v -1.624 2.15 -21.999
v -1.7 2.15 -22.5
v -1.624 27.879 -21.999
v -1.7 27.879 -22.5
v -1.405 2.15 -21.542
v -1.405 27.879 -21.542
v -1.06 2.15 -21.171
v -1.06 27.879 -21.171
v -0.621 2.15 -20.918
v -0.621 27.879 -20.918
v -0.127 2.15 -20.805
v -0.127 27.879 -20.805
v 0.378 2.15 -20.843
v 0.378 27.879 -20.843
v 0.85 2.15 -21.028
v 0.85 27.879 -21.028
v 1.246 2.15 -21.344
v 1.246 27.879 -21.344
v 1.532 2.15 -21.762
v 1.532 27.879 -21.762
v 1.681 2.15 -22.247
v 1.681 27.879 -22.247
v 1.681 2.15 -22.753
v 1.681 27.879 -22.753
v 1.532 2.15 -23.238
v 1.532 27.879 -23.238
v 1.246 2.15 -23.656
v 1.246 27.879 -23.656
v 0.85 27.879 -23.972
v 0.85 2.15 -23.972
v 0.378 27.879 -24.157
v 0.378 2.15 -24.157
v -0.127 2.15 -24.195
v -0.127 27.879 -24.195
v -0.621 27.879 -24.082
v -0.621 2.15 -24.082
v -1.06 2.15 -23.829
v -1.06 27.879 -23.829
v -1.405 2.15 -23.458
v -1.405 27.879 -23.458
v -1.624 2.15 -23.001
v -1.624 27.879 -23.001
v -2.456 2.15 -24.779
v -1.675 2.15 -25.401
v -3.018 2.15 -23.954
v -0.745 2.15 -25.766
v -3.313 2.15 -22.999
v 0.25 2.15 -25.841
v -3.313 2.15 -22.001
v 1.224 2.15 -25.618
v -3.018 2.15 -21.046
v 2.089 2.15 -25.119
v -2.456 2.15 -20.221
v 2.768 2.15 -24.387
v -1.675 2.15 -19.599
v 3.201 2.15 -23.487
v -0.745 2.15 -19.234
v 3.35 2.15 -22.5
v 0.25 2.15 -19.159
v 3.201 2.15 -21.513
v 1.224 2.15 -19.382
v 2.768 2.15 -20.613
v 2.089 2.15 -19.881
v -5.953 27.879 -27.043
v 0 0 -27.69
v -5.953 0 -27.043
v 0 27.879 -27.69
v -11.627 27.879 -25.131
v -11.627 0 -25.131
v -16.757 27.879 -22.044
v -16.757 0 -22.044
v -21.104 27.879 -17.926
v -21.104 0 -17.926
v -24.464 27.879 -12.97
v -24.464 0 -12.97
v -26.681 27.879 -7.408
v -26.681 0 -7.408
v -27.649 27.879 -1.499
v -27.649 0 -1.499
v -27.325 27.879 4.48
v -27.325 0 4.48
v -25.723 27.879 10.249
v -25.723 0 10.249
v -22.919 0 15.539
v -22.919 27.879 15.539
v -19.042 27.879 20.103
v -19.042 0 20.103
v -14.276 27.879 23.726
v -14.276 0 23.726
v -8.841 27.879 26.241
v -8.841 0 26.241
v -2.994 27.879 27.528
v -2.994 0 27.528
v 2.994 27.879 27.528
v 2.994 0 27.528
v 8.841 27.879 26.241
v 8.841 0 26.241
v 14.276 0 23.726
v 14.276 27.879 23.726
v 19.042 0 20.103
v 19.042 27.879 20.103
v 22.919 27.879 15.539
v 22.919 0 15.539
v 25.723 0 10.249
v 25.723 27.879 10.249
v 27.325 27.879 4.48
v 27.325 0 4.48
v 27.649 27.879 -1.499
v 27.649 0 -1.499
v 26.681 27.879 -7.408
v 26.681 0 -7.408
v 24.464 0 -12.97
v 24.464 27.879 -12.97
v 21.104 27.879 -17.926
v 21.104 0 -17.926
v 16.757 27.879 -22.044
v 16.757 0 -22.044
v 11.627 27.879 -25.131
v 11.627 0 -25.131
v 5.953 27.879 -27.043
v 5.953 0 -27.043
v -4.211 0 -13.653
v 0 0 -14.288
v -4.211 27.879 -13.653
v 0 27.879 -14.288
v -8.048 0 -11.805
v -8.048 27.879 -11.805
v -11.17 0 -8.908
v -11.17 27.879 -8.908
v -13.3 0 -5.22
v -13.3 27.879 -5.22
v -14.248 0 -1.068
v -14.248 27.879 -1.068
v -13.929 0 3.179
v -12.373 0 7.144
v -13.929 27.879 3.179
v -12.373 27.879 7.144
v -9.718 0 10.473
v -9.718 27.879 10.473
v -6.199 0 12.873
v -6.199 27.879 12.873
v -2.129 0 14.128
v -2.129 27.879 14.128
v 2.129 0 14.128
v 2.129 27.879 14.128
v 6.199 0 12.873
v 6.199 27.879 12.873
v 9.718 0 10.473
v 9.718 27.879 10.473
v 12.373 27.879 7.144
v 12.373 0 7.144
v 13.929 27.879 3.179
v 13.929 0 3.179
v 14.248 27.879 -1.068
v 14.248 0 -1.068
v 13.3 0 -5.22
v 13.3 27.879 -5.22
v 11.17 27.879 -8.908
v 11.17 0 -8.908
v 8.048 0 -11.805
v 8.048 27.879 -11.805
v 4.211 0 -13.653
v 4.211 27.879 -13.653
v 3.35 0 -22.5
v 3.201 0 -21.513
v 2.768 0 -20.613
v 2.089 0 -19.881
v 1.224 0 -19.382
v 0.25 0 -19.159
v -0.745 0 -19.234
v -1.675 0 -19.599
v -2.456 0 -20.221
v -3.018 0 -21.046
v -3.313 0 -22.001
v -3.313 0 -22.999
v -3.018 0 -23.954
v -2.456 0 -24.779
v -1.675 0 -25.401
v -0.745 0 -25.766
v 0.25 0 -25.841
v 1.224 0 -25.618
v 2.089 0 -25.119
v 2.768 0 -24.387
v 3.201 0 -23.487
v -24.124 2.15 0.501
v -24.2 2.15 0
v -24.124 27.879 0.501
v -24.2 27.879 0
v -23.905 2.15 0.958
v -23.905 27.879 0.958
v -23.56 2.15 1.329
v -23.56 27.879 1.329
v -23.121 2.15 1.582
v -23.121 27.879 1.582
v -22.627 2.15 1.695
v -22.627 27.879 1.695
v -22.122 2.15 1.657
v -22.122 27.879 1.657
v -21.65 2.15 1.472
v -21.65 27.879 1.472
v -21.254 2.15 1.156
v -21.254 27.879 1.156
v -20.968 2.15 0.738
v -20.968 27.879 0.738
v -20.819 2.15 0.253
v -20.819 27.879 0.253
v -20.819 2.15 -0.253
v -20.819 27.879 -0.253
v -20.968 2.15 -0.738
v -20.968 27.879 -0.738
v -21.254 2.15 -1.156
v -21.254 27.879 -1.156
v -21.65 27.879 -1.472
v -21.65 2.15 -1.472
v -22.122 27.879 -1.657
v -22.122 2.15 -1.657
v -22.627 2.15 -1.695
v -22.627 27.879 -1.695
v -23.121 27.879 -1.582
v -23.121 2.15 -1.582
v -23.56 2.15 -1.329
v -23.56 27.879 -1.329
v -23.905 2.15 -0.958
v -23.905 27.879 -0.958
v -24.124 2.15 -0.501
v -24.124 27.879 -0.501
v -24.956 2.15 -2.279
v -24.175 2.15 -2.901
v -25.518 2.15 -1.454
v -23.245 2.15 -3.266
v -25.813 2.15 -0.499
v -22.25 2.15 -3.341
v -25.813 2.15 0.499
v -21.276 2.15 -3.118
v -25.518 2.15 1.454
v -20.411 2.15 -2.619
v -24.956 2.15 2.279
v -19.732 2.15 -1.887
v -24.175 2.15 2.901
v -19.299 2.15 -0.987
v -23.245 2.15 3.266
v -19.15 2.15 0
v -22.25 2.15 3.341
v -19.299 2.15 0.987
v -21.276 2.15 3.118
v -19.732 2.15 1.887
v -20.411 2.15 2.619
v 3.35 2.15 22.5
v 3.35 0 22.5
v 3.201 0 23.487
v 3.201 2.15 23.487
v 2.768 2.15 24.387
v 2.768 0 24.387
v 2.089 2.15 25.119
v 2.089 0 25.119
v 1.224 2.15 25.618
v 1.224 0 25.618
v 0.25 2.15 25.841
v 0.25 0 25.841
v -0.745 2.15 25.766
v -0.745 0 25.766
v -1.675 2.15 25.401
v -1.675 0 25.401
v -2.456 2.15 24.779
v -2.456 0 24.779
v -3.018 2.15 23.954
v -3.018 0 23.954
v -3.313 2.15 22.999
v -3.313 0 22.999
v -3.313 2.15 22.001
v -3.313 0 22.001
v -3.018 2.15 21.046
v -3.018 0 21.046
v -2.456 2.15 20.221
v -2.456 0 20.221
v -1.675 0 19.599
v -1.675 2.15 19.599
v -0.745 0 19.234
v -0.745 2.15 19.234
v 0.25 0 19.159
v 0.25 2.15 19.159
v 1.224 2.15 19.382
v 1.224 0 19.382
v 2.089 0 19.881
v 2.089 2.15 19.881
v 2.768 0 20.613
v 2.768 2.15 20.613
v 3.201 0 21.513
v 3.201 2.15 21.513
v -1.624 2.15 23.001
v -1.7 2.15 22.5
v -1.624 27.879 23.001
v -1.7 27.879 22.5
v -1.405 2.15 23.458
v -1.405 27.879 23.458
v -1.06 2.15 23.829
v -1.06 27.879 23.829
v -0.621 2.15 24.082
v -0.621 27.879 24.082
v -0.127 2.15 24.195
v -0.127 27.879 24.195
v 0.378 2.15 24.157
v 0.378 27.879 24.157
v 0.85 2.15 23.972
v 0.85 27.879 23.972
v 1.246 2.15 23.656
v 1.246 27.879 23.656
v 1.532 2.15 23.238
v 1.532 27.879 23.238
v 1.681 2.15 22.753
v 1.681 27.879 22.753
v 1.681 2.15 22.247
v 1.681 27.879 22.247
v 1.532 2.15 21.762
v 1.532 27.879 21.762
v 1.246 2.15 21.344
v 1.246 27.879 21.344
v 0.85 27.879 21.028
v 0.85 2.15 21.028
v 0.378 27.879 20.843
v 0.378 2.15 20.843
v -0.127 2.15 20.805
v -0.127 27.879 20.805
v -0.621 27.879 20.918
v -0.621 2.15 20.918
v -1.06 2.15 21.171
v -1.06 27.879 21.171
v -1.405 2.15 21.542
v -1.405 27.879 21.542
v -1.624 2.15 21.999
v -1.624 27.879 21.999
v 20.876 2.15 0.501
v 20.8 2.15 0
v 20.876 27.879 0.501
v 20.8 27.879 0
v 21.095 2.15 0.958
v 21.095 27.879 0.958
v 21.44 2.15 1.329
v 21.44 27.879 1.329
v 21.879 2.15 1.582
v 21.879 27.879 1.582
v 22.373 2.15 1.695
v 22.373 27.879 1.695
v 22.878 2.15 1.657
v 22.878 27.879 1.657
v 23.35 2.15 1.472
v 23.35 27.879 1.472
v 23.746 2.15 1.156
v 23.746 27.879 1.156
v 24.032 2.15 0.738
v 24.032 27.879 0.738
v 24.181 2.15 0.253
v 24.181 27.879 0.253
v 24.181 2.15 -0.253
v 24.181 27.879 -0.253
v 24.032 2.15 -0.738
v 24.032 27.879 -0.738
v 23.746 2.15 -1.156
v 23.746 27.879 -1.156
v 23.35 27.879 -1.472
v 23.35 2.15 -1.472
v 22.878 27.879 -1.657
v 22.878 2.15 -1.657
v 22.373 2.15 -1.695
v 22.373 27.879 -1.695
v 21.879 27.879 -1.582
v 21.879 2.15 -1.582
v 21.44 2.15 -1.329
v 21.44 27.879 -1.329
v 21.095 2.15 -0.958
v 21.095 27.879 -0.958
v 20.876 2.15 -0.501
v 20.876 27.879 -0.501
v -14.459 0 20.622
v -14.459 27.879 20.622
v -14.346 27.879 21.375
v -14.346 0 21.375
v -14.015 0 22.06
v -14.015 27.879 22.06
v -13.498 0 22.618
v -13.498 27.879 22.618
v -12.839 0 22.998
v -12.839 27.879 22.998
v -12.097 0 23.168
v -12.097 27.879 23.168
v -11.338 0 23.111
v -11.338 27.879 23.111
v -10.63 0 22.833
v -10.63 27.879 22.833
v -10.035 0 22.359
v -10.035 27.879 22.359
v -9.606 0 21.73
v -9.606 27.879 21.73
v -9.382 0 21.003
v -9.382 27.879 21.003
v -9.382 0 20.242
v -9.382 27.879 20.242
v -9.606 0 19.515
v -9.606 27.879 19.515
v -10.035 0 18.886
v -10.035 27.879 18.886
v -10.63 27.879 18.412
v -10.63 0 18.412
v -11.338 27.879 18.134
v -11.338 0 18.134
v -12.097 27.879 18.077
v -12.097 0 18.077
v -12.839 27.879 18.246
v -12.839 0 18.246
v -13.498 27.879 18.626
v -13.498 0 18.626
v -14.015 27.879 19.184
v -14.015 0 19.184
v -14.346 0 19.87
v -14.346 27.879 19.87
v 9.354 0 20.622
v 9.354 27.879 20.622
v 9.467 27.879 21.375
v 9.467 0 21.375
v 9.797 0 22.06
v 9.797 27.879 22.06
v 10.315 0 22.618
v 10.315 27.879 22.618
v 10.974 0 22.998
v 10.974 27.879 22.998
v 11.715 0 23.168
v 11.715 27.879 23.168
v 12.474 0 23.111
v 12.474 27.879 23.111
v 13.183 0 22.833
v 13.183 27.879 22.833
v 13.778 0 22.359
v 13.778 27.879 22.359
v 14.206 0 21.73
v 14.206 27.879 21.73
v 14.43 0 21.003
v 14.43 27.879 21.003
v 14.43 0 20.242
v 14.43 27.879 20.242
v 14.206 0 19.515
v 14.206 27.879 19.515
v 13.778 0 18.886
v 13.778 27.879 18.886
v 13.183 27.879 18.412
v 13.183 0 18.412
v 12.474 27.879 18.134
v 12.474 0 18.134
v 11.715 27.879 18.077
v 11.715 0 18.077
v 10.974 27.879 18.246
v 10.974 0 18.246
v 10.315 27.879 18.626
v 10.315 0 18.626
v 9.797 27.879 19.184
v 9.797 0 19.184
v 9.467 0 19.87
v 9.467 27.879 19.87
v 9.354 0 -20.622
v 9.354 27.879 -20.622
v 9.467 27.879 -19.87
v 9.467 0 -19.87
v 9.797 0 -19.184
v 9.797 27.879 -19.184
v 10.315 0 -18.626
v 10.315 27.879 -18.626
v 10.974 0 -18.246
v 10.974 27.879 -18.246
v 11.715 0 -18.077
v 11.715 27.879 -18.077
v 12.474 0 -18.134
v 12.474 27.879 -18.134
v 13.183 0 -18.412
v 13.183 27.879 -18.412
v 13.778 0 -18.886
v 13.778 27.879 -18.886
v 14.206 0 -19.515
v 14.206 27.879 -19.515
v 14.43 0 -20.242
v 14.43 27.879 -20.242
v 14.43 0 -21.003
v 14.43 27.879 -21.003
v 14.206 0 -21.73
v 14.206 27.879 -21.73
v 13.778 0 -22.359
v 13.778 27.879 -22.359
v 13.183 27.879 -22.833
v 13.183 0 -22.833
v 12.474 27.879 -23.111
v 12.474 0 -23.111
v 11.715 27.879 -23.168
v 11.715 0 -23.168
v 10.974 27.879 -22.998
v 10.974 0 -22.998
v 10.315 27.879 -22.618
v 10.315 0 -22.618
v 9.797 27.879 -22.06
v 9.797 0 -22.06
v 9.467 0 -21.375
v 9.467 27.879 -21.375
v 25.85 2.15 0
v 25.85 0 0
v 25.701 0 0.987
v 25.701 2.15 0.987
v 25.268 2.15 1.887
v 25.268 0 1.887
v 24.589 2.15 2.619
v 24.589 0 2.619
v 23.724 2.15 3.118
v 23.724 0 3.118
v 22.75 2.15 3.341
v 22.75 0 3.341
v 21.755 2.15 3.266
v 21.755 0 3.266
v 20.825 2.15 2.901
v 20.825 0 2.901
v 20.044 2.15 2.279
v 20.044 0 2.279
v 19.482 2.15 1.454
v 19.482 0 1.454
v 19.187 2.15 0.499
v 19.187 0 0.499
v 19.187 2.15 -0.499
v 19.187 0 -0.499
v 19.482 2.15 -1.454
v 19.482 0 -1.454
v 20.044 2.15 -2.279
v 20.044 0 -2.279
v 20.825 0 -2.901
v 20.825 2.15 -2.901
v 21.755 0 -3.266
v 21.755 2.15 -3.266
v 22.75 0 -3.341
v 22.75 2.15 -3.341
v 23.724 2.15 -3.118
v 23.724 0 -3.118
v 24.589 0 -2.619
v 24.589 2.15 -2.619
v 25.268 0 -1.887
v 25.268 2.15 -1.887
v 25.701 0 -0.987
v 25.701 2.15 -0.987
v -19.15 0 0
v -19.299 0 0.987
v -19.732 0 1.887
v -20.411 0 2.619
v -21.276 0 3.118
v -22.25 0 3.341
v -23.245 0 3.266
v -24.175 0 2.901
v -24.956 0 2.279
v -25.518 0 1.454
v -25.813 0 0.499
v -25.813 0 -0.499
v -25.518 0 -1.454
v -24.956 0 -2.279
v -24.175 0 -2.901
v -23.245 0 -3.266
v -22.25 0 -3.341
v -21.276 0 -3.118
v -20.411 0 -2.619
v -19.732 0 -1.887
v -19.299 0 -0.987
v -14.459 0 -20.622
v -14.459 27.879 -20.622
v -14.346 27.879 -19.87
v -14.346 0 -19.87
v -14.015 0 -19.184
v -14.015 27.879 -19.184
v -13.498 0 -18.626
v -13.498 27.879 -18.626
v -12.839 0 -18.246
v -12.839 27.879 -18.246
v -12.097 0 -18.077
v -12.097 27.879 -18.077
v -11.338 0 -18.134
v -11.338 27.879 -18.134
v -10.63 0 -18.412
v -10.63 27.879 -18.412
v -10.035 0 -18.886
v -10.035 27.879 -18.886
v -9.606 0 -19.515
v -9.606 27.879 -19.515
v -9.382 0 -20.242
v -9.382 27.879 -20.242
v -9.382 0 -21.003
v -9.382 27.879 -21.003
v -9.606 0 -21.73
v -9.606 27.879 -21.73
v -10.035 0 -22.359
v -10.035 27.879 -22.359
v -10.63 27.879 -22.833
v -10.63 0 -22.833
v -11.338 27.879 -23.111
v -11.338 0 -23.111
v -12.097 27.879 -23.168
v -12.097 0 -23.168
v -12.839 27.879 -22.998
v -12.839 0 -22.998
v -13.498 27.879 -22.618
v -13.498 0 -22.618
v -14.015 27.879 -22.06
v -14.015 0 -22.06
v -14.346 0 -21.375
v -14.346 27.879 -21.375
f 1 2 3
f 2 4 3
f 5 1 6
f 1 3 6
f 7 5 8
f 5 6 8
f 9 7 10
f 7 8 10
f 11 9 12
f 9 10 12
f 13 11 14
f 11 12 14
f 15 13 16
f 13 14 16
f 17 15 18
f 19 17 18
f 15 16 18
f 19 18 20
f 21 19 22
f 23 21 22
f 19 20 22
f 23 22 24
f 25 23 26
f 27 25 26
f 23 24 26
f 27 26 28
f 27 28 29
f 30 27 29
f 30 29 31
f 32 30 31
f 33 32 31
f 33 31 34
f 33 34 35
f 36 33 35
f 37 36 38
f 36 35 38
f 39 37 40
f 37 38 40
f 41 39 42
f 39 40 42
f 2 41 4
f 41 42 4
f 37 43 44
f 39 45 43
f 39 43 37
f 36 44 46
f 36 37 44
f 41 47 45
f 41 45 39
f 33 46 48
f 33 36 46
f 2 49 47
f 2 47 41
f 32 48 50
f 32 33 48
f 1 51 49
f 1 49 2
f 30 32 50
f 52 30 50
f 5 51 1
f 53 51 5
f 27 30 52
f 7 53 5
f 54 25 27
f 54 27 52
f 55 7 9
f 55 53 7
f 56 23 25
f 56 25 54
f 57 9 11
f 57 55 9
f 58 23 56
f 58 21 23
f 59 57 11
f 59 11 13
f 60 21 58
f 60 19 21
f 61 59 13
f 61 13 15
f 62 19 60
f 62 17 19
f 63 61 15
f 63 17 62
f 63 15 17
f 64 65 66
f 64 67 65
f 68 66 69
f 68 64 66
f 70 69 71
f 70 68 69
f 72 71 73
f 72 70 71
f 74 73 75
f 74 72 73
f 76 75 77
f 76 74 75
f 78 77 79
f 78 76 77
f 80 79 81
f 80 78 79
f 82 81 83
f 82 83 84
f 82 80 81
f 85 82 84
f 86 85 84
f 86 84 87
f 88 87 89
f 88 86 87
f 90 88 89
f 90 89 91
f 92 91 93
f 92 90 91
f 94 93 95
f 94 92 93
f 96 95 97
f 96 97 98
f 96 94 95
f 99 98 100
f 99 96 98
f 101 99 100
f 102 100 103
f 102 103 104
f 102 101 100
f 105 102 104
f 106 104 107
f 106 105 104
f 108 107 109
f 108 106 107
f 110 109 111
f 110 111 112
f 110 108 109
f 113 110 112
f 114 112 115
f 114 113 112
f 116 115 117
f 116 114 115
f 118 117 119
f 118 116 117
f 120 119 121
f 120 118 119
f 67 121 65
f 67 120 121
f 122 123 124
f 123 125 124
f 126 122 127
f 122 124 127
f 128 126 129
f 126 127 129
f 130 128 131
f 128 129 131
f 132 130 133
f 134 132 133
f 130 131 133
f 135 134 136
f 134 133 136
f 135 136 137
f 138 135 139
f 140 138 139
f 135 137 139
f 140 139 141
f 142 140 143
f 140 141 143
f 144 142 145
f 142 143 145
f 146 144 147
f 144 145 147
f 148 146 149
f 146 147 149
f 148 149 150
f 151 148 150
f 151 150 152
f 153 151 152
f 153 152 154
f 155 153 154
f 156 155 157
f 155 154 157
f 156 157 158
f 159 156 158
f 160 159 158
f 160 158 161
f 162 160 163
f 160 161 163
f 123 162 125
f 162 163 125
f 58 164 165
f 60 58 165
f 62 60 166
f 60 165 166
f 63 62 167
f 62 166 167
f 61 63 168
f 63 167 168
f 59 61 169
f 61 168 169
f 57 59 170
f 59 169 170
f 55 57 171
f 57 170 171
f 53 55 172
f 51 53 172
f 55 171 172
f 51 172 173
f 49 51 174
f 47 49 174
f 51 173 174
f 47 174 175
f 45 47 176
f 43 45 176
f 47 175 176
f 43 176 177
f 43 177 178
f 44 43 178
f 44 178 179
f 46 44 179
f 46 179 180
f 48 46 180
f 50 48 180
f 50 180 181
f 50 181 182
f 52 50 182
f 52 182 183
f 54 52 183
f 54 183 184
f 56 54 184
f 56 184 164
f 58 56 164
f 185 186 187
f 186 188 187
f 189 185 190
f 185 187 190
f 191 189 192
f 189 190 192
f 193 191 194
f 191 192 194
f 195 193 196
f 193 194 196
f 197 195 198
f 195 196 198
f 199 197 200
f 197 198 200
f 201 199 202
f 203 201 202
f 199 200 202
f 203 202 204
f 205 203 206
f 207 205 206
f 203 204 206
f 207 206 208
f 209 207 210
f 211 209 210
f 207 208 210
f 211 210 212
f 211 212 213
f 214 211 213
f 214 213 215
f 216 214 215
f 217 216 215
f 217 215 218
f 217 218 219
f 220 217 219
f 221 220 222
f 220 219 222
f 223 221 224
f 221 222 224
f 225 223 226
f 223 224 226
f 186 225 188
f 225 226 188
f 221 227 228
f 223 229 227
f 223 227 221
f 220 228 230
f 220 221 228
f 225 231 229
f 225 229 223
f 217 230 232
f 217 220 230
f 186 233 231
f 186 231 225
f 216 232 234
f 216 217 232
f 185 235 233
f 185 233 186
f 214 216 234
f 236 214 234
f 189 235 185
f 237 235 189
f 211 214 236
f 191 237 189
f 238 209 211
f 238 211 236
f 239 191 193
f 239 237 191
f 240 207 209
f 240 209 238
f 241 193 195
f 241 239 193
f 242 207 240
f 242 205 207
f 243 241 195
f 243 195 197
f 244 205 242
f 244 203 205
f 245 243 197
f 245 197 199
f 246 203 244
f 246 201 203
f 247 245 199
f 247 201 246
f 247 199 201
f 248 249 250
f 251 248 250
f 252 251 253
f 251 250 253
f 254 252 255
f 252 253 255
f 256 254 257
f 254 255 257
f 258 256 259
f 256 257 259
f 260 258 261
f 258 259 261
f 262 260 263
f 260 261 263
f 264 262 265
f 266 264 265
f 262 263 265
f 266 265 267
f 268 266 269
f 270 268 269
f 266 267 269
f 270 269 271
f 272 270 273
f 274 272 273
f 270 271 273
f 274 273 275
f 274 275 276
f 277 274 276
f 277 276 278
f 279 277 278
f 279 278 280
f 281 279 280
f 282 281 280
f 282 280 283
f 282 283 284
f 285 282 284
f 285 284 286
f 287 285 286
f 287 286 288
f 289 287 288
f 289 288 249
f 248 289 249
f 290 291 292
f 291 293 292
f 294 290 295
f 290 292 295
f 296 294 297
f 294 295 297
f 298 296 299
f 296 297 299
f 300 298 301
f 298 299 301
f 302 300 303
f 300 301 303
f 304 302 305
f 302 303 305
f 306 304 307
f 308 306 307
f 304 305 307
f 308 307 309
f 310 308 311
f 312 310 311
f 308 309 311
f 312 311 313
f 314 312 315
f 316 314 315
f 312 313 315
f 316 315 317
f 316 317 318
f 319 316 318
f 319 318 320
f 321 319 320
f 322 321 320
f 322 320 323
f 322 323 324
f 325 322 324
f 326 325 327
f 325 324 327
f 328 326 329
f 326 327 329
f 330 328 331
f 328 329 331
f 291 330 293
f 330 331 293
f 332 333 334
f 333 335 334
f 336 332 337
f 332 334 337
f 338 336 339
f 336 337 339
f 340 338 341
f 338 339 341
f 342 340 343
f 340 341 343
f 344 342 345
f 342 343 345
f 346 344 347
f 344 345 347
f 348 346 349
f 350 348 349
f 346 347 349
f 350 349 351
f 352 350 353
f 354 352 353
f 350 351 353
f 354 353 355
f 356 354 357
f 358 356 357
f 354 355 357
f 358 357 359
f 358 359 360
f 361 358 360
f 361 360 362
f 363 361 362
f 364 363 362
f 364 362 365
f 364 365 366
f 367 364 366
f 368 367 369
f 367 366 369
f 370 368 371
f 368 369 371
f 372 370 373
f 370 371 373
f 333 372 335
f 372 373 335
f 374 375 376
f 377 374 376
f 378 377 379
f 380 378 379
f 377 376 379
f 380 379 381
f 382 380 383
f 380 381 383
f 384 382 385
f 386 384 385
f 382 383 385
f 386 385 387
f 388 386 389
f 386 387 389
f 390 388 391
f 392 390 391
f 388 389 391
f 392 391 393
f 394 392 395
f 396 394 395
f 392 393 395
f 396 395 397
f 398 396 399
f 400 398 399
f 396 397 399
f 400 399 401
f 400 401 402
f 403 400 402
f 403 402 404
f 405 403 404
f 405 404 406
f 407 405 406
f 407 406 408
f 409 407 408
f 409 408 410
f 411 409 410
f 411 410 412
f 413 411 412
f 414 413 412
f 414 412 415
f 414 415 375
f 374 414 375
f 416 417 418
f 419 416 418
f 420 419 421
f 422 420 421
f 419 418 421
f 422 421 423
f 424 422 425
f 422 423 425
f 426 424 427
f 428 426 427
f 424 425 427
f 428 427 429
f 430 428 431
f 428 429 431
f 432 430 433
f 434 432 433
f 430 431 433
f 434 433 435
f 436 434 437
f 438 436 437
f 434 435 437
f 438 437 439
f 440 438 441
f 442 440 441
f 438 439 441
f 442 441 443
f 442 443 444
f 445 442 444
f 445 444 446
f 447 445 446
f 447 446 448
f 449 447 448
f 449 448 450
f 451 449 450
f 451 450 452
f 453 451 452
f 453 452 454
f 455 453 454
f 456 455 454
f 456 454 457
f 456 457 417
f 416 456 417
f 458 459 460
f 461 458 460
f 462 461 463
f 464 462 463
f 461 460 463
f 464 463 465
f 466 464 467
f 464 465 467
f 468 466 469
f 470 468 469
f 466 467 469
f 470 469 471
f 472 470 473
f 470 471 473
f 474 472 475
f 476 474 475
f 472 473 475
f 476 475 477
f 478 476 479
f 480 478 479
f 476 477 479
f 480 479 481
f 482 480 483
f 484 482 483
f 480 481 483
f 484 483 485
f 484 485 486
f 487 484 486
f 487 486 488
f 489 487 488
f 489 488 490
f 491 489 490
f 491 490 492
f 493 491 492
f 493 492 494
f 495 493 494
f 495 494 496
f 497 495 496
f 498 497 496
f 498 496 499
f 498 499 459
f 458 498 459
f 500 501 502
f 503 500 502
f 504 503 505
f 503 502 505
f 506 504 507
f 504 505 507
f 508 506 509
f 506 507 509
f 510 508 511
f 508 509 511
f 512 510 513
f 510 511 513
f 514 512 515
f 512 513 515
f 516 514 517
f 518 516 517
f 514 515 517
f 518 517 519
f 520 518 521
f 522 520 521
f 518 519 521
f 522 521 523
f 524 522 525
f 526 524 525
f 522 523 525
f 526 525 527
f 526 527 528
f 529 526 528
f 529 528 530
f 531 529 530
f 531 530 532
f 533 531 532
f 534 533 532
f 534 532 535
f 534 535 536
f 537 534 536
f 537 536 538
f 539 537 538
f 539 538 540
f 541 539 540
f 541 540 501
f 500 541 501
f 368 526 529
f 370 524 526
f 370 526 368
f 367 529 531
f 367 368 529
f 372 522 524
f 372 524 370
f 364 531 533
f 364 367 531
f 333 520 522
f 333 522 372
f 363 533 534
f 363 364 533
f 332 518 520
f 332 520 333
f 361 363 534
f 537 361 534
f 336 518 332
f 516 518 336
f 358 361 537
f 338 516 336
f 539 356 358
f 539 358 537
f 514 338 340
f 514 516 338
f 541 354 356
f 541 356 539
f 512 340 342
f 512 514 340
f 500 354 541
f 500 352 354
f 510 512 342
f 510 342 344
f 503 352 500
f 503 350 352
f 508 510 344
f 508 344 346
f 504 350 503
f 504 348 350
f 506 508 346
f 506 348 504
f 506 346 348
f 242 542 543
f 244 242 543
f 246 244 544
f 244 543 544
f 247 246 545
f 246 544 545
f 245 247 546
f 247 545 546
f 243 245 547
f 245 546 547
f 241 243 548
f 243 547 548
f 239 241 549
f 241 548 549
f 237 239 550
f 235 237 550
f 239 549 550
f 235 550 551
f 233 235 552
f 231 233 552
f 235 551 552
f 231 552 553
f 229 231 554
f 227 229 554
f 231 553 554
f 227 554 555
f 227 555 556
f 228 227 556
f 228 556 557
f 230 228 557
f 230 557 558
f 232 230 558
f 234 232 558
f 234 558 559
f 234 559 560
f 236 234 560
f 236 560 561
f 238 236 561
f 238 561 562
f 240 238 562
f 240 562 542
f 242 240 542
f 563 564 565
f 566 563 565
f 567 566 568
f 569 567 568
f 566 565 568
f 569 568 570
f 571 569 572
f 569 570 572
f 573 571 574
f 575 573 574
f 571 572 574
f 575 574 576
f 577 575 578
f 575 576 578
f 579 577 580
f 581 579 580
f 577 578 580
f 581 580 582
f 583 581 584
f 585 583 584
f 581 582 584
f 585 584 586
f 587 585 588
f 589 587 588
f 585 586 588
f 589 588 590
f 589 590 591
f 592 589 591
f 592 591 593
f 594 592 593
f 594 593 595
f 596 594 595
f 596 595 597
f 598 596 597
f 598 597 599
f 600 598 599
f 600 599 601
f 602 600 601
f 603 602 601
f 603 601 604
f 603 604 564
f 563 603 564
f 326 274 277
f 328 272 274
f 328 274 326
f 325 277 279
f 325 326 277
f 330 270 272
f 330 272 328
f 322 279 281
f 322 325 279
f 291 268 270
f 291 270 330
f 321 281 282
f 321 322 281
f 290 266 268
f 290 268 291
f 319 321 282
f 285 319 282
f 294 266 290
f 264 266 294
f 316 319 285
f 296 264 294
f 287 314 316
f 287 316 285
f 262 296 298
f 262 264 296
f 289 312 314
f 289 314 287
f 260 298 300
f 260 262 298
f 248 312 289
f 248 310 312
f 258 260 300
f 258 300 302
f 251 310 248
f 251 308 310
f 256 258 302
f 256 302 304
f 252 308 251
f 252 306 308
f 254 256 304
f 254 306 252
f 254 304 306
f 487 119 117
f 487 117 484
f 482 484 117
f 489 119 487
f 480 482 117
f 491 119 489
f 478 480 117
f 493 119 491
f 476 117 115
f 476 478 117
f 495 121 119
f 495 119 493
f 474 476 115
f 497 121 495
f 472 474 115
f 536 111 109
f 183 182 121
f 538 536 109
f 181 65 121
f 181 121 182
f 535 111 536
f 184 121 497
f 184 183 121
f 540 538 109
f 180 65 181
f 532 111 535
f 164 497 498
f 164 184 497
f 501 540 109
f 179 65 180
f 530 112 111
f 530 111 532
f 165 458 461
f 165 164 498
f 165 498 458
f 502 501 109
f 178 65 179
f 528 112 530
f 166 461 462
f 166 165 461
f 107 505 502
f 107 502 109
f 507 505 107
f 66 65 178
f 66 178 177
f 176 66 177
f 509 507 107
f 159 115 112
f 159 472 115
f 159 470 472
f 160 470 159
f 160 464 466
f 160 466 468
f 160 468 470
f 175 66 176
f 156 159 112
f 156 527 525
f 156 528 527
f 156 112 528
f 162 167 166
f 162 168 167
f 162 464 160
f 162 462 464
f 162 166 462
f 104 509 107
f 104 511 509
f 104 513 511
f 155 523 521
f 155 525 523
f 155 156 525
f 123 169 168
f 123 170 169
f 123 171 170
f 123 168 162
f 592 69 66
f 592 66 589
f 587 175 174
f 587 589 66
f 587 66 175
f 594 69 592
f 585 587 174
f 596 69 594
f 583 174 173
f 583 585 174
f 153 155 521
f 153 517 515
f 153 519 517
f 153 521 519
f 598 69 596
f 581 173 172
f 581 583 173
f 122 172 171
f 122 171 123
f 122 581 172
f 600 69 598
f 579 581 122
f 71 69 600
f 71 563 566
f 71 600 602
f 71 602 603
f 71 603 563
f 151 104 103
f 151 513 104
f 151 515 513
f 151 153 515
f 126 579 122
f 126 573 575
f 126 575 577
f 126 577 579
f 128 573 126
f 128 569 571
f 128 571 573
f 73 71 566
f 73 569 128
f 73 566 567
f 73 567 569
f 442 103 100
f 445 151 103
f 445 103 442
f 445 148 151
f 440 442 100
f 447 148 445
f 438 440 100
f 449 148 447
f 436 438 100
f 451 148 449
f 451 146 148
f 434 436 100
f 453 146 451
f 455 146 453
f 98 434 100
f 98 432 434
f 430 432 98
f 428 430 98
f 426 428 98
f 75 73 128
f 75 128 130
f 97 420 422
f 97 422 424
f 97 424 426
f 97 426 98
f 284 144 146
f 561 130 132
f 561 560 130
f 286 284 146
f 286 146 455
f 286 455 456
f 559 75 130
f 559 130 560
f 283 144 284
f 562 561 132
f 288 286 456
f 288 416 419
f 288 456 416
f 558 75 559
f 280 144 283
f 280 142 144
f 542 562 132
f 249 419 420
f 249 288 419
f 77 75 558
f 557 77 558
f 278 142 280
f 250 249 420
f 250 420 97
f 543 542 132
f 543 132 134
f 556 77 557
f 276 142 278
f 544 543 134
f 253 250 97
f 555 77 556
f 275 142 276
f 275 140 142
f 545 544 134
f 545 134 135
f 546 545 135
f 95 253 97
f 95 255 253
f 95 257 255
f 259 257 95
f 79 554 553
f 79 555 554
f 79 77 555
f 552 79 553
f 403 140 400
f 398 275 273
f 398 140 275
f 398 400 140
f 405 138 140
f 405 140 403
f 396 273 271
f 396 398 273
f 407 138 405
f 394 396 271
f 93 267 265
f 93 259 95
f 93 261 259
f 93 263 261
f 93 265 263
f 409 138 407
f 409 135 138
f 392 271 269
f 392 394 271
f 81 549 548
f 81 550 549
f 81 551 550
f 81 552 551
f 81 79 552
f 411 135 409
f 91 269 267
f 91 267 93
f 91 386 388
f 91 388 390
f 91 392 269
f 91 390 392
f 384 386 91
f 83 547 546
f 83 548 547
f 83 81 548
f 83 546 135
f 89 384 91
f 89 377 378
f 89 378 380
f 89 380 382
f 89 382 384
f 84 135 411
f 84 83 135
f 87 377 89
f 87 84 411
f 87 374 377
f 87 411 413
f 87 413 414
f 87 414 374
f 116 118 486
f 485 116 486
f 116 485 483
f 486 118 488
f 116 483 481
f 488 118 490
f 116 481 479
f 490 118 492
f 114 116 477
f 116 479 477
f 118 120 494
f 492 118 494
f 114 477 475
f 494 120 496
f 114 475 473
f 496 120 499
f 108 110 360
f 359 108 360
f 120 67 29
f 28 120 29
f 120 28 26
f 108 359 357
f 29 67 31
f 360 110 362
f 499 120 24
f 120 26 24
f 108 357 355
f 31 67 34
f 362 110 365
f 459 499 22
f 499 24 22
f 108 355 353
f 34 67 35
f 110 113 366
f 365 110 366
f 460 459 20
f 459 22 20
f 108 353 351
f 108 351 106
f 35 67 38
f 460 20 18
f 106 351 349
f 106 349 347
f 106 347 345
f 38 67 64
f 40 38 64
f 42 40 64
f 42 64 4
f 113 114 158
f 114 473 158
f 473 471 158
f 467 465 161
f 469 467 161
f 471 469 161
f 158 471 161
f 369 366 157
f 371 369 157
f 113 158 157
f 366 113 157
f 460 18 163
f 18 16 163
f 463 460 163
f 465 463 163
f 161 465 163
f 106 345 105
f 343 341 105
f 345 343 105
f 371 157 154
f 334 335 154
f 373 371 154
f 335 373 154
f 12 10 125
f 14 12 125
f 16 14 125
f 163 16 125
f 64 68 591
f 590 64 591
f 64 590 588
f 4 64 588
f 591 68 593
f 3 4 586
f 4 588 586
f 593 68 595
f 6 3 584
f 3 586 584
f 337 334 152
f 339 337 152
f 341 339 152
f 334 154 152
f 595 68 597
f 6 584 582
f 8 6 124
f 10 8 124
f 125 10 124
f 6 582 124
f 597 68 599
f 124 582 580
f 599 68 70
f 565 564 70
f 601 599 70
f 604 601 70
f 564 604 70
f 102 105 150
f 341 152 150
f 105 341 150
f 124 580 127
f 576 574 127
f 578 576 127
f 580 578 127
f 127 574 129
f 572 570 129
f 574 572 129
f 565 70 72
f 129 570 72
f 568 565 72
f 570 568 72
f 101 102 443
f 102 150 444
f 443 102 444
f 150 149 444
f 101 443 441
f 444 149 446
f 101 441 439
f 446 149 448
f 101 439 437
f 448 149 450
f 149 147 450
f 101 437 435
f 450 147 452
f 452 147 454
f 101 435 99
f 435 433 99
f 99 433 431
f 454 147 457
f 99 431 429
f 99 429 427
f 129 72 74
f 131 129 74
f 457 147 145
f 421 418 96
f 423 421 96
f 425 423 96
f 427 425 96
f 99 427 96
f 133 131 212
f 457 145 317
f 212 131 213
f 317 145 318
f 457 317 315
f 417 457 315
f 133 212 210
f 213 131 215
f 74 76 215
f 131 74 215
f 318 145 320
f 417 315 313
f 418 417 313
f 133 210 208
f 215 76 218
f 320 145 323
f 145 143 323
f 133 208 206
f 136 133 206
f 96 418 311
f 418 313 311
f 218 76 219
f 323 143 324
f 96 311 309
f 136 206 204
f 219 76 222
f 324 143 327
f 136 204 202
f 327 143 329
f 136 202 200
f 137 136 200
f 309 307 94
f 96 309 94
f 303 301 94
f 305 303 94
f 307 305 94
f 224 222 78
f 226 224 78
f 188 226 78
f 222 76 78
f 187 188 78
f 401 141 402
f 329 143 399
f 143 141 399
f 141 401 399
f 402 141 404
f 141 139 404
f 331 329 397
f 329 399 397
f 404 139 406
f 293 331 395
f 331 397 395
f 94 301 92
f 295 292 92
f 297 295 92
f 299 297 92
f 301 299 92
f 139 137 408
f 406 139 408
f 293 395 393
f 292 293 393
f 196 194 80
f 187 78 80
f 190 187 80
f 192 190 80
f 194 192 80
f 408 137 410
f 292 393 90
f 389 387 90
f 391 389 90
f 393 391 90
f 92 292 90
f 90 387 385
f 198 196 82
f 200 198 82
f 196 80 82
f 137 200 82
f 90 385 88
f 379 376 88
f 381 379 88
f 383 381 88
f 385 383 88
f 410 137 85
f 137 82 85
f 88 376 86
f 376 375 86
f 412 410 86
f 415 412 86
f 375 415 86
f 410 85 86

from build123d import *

# Parameters (mm, degrees)
SKETCH1_W                       = 13.4025
SKETCH1_H                       = 27.8791
CBORE_FOR_M3_SBHCS1_D           = 3.4
CBORE_FOR_M3_SBHCS1_CBORE_D     = 6.7
CBORE_FOR_M3_SBHCS1_CBORE_DEPTH = 2.15
F_10_CLEARANCE_HOLE1_D          = 5.1054


with BuildPart() as part:
    # Sketch1 → Revolve1 (revolve)
    with BuildSketch(Plane.XY, mode=Mode.PRIVATE) as revolve1_sk:
        with Locations((20.98875, 13.93955)):
            Rectangle(SKETCH1_W, SKETCH1_H)
    revolve(revolve1_sk.sketch.rotate(Axis((0, 0, 0), (0, 1, 0)), 90), axis=Axis((0, 0, 0), (0, 1, 0)))

    # CBORE for M3 SBHCS1 (through all)
    with Locations(Plane.XZ):
        with Locations((0, 22.5), (0, -22.5), (22.5, 0), (-22.5, 0)):
            CounterBoreHole(CBORE_FOR_M3_SBHCS1_D / 2, CBORE_FOR_M3_SBHCS1_CBORE_D / 2, CBORE_FOR_M3_SBHCS1_CBORE_DEPTH)

    # #10 Clearance Hole1 (through all)
    with Locations(Plane.XZ):
        with Locations((-11.90625, 20.622229928), (-11.90625, -20.622229928), (11.90625, -20.622229928), (11.90625, 20.622229928)):
            Hole(F_10_CLEARANCE_HOLE1_D / 2)


solid = part.part
